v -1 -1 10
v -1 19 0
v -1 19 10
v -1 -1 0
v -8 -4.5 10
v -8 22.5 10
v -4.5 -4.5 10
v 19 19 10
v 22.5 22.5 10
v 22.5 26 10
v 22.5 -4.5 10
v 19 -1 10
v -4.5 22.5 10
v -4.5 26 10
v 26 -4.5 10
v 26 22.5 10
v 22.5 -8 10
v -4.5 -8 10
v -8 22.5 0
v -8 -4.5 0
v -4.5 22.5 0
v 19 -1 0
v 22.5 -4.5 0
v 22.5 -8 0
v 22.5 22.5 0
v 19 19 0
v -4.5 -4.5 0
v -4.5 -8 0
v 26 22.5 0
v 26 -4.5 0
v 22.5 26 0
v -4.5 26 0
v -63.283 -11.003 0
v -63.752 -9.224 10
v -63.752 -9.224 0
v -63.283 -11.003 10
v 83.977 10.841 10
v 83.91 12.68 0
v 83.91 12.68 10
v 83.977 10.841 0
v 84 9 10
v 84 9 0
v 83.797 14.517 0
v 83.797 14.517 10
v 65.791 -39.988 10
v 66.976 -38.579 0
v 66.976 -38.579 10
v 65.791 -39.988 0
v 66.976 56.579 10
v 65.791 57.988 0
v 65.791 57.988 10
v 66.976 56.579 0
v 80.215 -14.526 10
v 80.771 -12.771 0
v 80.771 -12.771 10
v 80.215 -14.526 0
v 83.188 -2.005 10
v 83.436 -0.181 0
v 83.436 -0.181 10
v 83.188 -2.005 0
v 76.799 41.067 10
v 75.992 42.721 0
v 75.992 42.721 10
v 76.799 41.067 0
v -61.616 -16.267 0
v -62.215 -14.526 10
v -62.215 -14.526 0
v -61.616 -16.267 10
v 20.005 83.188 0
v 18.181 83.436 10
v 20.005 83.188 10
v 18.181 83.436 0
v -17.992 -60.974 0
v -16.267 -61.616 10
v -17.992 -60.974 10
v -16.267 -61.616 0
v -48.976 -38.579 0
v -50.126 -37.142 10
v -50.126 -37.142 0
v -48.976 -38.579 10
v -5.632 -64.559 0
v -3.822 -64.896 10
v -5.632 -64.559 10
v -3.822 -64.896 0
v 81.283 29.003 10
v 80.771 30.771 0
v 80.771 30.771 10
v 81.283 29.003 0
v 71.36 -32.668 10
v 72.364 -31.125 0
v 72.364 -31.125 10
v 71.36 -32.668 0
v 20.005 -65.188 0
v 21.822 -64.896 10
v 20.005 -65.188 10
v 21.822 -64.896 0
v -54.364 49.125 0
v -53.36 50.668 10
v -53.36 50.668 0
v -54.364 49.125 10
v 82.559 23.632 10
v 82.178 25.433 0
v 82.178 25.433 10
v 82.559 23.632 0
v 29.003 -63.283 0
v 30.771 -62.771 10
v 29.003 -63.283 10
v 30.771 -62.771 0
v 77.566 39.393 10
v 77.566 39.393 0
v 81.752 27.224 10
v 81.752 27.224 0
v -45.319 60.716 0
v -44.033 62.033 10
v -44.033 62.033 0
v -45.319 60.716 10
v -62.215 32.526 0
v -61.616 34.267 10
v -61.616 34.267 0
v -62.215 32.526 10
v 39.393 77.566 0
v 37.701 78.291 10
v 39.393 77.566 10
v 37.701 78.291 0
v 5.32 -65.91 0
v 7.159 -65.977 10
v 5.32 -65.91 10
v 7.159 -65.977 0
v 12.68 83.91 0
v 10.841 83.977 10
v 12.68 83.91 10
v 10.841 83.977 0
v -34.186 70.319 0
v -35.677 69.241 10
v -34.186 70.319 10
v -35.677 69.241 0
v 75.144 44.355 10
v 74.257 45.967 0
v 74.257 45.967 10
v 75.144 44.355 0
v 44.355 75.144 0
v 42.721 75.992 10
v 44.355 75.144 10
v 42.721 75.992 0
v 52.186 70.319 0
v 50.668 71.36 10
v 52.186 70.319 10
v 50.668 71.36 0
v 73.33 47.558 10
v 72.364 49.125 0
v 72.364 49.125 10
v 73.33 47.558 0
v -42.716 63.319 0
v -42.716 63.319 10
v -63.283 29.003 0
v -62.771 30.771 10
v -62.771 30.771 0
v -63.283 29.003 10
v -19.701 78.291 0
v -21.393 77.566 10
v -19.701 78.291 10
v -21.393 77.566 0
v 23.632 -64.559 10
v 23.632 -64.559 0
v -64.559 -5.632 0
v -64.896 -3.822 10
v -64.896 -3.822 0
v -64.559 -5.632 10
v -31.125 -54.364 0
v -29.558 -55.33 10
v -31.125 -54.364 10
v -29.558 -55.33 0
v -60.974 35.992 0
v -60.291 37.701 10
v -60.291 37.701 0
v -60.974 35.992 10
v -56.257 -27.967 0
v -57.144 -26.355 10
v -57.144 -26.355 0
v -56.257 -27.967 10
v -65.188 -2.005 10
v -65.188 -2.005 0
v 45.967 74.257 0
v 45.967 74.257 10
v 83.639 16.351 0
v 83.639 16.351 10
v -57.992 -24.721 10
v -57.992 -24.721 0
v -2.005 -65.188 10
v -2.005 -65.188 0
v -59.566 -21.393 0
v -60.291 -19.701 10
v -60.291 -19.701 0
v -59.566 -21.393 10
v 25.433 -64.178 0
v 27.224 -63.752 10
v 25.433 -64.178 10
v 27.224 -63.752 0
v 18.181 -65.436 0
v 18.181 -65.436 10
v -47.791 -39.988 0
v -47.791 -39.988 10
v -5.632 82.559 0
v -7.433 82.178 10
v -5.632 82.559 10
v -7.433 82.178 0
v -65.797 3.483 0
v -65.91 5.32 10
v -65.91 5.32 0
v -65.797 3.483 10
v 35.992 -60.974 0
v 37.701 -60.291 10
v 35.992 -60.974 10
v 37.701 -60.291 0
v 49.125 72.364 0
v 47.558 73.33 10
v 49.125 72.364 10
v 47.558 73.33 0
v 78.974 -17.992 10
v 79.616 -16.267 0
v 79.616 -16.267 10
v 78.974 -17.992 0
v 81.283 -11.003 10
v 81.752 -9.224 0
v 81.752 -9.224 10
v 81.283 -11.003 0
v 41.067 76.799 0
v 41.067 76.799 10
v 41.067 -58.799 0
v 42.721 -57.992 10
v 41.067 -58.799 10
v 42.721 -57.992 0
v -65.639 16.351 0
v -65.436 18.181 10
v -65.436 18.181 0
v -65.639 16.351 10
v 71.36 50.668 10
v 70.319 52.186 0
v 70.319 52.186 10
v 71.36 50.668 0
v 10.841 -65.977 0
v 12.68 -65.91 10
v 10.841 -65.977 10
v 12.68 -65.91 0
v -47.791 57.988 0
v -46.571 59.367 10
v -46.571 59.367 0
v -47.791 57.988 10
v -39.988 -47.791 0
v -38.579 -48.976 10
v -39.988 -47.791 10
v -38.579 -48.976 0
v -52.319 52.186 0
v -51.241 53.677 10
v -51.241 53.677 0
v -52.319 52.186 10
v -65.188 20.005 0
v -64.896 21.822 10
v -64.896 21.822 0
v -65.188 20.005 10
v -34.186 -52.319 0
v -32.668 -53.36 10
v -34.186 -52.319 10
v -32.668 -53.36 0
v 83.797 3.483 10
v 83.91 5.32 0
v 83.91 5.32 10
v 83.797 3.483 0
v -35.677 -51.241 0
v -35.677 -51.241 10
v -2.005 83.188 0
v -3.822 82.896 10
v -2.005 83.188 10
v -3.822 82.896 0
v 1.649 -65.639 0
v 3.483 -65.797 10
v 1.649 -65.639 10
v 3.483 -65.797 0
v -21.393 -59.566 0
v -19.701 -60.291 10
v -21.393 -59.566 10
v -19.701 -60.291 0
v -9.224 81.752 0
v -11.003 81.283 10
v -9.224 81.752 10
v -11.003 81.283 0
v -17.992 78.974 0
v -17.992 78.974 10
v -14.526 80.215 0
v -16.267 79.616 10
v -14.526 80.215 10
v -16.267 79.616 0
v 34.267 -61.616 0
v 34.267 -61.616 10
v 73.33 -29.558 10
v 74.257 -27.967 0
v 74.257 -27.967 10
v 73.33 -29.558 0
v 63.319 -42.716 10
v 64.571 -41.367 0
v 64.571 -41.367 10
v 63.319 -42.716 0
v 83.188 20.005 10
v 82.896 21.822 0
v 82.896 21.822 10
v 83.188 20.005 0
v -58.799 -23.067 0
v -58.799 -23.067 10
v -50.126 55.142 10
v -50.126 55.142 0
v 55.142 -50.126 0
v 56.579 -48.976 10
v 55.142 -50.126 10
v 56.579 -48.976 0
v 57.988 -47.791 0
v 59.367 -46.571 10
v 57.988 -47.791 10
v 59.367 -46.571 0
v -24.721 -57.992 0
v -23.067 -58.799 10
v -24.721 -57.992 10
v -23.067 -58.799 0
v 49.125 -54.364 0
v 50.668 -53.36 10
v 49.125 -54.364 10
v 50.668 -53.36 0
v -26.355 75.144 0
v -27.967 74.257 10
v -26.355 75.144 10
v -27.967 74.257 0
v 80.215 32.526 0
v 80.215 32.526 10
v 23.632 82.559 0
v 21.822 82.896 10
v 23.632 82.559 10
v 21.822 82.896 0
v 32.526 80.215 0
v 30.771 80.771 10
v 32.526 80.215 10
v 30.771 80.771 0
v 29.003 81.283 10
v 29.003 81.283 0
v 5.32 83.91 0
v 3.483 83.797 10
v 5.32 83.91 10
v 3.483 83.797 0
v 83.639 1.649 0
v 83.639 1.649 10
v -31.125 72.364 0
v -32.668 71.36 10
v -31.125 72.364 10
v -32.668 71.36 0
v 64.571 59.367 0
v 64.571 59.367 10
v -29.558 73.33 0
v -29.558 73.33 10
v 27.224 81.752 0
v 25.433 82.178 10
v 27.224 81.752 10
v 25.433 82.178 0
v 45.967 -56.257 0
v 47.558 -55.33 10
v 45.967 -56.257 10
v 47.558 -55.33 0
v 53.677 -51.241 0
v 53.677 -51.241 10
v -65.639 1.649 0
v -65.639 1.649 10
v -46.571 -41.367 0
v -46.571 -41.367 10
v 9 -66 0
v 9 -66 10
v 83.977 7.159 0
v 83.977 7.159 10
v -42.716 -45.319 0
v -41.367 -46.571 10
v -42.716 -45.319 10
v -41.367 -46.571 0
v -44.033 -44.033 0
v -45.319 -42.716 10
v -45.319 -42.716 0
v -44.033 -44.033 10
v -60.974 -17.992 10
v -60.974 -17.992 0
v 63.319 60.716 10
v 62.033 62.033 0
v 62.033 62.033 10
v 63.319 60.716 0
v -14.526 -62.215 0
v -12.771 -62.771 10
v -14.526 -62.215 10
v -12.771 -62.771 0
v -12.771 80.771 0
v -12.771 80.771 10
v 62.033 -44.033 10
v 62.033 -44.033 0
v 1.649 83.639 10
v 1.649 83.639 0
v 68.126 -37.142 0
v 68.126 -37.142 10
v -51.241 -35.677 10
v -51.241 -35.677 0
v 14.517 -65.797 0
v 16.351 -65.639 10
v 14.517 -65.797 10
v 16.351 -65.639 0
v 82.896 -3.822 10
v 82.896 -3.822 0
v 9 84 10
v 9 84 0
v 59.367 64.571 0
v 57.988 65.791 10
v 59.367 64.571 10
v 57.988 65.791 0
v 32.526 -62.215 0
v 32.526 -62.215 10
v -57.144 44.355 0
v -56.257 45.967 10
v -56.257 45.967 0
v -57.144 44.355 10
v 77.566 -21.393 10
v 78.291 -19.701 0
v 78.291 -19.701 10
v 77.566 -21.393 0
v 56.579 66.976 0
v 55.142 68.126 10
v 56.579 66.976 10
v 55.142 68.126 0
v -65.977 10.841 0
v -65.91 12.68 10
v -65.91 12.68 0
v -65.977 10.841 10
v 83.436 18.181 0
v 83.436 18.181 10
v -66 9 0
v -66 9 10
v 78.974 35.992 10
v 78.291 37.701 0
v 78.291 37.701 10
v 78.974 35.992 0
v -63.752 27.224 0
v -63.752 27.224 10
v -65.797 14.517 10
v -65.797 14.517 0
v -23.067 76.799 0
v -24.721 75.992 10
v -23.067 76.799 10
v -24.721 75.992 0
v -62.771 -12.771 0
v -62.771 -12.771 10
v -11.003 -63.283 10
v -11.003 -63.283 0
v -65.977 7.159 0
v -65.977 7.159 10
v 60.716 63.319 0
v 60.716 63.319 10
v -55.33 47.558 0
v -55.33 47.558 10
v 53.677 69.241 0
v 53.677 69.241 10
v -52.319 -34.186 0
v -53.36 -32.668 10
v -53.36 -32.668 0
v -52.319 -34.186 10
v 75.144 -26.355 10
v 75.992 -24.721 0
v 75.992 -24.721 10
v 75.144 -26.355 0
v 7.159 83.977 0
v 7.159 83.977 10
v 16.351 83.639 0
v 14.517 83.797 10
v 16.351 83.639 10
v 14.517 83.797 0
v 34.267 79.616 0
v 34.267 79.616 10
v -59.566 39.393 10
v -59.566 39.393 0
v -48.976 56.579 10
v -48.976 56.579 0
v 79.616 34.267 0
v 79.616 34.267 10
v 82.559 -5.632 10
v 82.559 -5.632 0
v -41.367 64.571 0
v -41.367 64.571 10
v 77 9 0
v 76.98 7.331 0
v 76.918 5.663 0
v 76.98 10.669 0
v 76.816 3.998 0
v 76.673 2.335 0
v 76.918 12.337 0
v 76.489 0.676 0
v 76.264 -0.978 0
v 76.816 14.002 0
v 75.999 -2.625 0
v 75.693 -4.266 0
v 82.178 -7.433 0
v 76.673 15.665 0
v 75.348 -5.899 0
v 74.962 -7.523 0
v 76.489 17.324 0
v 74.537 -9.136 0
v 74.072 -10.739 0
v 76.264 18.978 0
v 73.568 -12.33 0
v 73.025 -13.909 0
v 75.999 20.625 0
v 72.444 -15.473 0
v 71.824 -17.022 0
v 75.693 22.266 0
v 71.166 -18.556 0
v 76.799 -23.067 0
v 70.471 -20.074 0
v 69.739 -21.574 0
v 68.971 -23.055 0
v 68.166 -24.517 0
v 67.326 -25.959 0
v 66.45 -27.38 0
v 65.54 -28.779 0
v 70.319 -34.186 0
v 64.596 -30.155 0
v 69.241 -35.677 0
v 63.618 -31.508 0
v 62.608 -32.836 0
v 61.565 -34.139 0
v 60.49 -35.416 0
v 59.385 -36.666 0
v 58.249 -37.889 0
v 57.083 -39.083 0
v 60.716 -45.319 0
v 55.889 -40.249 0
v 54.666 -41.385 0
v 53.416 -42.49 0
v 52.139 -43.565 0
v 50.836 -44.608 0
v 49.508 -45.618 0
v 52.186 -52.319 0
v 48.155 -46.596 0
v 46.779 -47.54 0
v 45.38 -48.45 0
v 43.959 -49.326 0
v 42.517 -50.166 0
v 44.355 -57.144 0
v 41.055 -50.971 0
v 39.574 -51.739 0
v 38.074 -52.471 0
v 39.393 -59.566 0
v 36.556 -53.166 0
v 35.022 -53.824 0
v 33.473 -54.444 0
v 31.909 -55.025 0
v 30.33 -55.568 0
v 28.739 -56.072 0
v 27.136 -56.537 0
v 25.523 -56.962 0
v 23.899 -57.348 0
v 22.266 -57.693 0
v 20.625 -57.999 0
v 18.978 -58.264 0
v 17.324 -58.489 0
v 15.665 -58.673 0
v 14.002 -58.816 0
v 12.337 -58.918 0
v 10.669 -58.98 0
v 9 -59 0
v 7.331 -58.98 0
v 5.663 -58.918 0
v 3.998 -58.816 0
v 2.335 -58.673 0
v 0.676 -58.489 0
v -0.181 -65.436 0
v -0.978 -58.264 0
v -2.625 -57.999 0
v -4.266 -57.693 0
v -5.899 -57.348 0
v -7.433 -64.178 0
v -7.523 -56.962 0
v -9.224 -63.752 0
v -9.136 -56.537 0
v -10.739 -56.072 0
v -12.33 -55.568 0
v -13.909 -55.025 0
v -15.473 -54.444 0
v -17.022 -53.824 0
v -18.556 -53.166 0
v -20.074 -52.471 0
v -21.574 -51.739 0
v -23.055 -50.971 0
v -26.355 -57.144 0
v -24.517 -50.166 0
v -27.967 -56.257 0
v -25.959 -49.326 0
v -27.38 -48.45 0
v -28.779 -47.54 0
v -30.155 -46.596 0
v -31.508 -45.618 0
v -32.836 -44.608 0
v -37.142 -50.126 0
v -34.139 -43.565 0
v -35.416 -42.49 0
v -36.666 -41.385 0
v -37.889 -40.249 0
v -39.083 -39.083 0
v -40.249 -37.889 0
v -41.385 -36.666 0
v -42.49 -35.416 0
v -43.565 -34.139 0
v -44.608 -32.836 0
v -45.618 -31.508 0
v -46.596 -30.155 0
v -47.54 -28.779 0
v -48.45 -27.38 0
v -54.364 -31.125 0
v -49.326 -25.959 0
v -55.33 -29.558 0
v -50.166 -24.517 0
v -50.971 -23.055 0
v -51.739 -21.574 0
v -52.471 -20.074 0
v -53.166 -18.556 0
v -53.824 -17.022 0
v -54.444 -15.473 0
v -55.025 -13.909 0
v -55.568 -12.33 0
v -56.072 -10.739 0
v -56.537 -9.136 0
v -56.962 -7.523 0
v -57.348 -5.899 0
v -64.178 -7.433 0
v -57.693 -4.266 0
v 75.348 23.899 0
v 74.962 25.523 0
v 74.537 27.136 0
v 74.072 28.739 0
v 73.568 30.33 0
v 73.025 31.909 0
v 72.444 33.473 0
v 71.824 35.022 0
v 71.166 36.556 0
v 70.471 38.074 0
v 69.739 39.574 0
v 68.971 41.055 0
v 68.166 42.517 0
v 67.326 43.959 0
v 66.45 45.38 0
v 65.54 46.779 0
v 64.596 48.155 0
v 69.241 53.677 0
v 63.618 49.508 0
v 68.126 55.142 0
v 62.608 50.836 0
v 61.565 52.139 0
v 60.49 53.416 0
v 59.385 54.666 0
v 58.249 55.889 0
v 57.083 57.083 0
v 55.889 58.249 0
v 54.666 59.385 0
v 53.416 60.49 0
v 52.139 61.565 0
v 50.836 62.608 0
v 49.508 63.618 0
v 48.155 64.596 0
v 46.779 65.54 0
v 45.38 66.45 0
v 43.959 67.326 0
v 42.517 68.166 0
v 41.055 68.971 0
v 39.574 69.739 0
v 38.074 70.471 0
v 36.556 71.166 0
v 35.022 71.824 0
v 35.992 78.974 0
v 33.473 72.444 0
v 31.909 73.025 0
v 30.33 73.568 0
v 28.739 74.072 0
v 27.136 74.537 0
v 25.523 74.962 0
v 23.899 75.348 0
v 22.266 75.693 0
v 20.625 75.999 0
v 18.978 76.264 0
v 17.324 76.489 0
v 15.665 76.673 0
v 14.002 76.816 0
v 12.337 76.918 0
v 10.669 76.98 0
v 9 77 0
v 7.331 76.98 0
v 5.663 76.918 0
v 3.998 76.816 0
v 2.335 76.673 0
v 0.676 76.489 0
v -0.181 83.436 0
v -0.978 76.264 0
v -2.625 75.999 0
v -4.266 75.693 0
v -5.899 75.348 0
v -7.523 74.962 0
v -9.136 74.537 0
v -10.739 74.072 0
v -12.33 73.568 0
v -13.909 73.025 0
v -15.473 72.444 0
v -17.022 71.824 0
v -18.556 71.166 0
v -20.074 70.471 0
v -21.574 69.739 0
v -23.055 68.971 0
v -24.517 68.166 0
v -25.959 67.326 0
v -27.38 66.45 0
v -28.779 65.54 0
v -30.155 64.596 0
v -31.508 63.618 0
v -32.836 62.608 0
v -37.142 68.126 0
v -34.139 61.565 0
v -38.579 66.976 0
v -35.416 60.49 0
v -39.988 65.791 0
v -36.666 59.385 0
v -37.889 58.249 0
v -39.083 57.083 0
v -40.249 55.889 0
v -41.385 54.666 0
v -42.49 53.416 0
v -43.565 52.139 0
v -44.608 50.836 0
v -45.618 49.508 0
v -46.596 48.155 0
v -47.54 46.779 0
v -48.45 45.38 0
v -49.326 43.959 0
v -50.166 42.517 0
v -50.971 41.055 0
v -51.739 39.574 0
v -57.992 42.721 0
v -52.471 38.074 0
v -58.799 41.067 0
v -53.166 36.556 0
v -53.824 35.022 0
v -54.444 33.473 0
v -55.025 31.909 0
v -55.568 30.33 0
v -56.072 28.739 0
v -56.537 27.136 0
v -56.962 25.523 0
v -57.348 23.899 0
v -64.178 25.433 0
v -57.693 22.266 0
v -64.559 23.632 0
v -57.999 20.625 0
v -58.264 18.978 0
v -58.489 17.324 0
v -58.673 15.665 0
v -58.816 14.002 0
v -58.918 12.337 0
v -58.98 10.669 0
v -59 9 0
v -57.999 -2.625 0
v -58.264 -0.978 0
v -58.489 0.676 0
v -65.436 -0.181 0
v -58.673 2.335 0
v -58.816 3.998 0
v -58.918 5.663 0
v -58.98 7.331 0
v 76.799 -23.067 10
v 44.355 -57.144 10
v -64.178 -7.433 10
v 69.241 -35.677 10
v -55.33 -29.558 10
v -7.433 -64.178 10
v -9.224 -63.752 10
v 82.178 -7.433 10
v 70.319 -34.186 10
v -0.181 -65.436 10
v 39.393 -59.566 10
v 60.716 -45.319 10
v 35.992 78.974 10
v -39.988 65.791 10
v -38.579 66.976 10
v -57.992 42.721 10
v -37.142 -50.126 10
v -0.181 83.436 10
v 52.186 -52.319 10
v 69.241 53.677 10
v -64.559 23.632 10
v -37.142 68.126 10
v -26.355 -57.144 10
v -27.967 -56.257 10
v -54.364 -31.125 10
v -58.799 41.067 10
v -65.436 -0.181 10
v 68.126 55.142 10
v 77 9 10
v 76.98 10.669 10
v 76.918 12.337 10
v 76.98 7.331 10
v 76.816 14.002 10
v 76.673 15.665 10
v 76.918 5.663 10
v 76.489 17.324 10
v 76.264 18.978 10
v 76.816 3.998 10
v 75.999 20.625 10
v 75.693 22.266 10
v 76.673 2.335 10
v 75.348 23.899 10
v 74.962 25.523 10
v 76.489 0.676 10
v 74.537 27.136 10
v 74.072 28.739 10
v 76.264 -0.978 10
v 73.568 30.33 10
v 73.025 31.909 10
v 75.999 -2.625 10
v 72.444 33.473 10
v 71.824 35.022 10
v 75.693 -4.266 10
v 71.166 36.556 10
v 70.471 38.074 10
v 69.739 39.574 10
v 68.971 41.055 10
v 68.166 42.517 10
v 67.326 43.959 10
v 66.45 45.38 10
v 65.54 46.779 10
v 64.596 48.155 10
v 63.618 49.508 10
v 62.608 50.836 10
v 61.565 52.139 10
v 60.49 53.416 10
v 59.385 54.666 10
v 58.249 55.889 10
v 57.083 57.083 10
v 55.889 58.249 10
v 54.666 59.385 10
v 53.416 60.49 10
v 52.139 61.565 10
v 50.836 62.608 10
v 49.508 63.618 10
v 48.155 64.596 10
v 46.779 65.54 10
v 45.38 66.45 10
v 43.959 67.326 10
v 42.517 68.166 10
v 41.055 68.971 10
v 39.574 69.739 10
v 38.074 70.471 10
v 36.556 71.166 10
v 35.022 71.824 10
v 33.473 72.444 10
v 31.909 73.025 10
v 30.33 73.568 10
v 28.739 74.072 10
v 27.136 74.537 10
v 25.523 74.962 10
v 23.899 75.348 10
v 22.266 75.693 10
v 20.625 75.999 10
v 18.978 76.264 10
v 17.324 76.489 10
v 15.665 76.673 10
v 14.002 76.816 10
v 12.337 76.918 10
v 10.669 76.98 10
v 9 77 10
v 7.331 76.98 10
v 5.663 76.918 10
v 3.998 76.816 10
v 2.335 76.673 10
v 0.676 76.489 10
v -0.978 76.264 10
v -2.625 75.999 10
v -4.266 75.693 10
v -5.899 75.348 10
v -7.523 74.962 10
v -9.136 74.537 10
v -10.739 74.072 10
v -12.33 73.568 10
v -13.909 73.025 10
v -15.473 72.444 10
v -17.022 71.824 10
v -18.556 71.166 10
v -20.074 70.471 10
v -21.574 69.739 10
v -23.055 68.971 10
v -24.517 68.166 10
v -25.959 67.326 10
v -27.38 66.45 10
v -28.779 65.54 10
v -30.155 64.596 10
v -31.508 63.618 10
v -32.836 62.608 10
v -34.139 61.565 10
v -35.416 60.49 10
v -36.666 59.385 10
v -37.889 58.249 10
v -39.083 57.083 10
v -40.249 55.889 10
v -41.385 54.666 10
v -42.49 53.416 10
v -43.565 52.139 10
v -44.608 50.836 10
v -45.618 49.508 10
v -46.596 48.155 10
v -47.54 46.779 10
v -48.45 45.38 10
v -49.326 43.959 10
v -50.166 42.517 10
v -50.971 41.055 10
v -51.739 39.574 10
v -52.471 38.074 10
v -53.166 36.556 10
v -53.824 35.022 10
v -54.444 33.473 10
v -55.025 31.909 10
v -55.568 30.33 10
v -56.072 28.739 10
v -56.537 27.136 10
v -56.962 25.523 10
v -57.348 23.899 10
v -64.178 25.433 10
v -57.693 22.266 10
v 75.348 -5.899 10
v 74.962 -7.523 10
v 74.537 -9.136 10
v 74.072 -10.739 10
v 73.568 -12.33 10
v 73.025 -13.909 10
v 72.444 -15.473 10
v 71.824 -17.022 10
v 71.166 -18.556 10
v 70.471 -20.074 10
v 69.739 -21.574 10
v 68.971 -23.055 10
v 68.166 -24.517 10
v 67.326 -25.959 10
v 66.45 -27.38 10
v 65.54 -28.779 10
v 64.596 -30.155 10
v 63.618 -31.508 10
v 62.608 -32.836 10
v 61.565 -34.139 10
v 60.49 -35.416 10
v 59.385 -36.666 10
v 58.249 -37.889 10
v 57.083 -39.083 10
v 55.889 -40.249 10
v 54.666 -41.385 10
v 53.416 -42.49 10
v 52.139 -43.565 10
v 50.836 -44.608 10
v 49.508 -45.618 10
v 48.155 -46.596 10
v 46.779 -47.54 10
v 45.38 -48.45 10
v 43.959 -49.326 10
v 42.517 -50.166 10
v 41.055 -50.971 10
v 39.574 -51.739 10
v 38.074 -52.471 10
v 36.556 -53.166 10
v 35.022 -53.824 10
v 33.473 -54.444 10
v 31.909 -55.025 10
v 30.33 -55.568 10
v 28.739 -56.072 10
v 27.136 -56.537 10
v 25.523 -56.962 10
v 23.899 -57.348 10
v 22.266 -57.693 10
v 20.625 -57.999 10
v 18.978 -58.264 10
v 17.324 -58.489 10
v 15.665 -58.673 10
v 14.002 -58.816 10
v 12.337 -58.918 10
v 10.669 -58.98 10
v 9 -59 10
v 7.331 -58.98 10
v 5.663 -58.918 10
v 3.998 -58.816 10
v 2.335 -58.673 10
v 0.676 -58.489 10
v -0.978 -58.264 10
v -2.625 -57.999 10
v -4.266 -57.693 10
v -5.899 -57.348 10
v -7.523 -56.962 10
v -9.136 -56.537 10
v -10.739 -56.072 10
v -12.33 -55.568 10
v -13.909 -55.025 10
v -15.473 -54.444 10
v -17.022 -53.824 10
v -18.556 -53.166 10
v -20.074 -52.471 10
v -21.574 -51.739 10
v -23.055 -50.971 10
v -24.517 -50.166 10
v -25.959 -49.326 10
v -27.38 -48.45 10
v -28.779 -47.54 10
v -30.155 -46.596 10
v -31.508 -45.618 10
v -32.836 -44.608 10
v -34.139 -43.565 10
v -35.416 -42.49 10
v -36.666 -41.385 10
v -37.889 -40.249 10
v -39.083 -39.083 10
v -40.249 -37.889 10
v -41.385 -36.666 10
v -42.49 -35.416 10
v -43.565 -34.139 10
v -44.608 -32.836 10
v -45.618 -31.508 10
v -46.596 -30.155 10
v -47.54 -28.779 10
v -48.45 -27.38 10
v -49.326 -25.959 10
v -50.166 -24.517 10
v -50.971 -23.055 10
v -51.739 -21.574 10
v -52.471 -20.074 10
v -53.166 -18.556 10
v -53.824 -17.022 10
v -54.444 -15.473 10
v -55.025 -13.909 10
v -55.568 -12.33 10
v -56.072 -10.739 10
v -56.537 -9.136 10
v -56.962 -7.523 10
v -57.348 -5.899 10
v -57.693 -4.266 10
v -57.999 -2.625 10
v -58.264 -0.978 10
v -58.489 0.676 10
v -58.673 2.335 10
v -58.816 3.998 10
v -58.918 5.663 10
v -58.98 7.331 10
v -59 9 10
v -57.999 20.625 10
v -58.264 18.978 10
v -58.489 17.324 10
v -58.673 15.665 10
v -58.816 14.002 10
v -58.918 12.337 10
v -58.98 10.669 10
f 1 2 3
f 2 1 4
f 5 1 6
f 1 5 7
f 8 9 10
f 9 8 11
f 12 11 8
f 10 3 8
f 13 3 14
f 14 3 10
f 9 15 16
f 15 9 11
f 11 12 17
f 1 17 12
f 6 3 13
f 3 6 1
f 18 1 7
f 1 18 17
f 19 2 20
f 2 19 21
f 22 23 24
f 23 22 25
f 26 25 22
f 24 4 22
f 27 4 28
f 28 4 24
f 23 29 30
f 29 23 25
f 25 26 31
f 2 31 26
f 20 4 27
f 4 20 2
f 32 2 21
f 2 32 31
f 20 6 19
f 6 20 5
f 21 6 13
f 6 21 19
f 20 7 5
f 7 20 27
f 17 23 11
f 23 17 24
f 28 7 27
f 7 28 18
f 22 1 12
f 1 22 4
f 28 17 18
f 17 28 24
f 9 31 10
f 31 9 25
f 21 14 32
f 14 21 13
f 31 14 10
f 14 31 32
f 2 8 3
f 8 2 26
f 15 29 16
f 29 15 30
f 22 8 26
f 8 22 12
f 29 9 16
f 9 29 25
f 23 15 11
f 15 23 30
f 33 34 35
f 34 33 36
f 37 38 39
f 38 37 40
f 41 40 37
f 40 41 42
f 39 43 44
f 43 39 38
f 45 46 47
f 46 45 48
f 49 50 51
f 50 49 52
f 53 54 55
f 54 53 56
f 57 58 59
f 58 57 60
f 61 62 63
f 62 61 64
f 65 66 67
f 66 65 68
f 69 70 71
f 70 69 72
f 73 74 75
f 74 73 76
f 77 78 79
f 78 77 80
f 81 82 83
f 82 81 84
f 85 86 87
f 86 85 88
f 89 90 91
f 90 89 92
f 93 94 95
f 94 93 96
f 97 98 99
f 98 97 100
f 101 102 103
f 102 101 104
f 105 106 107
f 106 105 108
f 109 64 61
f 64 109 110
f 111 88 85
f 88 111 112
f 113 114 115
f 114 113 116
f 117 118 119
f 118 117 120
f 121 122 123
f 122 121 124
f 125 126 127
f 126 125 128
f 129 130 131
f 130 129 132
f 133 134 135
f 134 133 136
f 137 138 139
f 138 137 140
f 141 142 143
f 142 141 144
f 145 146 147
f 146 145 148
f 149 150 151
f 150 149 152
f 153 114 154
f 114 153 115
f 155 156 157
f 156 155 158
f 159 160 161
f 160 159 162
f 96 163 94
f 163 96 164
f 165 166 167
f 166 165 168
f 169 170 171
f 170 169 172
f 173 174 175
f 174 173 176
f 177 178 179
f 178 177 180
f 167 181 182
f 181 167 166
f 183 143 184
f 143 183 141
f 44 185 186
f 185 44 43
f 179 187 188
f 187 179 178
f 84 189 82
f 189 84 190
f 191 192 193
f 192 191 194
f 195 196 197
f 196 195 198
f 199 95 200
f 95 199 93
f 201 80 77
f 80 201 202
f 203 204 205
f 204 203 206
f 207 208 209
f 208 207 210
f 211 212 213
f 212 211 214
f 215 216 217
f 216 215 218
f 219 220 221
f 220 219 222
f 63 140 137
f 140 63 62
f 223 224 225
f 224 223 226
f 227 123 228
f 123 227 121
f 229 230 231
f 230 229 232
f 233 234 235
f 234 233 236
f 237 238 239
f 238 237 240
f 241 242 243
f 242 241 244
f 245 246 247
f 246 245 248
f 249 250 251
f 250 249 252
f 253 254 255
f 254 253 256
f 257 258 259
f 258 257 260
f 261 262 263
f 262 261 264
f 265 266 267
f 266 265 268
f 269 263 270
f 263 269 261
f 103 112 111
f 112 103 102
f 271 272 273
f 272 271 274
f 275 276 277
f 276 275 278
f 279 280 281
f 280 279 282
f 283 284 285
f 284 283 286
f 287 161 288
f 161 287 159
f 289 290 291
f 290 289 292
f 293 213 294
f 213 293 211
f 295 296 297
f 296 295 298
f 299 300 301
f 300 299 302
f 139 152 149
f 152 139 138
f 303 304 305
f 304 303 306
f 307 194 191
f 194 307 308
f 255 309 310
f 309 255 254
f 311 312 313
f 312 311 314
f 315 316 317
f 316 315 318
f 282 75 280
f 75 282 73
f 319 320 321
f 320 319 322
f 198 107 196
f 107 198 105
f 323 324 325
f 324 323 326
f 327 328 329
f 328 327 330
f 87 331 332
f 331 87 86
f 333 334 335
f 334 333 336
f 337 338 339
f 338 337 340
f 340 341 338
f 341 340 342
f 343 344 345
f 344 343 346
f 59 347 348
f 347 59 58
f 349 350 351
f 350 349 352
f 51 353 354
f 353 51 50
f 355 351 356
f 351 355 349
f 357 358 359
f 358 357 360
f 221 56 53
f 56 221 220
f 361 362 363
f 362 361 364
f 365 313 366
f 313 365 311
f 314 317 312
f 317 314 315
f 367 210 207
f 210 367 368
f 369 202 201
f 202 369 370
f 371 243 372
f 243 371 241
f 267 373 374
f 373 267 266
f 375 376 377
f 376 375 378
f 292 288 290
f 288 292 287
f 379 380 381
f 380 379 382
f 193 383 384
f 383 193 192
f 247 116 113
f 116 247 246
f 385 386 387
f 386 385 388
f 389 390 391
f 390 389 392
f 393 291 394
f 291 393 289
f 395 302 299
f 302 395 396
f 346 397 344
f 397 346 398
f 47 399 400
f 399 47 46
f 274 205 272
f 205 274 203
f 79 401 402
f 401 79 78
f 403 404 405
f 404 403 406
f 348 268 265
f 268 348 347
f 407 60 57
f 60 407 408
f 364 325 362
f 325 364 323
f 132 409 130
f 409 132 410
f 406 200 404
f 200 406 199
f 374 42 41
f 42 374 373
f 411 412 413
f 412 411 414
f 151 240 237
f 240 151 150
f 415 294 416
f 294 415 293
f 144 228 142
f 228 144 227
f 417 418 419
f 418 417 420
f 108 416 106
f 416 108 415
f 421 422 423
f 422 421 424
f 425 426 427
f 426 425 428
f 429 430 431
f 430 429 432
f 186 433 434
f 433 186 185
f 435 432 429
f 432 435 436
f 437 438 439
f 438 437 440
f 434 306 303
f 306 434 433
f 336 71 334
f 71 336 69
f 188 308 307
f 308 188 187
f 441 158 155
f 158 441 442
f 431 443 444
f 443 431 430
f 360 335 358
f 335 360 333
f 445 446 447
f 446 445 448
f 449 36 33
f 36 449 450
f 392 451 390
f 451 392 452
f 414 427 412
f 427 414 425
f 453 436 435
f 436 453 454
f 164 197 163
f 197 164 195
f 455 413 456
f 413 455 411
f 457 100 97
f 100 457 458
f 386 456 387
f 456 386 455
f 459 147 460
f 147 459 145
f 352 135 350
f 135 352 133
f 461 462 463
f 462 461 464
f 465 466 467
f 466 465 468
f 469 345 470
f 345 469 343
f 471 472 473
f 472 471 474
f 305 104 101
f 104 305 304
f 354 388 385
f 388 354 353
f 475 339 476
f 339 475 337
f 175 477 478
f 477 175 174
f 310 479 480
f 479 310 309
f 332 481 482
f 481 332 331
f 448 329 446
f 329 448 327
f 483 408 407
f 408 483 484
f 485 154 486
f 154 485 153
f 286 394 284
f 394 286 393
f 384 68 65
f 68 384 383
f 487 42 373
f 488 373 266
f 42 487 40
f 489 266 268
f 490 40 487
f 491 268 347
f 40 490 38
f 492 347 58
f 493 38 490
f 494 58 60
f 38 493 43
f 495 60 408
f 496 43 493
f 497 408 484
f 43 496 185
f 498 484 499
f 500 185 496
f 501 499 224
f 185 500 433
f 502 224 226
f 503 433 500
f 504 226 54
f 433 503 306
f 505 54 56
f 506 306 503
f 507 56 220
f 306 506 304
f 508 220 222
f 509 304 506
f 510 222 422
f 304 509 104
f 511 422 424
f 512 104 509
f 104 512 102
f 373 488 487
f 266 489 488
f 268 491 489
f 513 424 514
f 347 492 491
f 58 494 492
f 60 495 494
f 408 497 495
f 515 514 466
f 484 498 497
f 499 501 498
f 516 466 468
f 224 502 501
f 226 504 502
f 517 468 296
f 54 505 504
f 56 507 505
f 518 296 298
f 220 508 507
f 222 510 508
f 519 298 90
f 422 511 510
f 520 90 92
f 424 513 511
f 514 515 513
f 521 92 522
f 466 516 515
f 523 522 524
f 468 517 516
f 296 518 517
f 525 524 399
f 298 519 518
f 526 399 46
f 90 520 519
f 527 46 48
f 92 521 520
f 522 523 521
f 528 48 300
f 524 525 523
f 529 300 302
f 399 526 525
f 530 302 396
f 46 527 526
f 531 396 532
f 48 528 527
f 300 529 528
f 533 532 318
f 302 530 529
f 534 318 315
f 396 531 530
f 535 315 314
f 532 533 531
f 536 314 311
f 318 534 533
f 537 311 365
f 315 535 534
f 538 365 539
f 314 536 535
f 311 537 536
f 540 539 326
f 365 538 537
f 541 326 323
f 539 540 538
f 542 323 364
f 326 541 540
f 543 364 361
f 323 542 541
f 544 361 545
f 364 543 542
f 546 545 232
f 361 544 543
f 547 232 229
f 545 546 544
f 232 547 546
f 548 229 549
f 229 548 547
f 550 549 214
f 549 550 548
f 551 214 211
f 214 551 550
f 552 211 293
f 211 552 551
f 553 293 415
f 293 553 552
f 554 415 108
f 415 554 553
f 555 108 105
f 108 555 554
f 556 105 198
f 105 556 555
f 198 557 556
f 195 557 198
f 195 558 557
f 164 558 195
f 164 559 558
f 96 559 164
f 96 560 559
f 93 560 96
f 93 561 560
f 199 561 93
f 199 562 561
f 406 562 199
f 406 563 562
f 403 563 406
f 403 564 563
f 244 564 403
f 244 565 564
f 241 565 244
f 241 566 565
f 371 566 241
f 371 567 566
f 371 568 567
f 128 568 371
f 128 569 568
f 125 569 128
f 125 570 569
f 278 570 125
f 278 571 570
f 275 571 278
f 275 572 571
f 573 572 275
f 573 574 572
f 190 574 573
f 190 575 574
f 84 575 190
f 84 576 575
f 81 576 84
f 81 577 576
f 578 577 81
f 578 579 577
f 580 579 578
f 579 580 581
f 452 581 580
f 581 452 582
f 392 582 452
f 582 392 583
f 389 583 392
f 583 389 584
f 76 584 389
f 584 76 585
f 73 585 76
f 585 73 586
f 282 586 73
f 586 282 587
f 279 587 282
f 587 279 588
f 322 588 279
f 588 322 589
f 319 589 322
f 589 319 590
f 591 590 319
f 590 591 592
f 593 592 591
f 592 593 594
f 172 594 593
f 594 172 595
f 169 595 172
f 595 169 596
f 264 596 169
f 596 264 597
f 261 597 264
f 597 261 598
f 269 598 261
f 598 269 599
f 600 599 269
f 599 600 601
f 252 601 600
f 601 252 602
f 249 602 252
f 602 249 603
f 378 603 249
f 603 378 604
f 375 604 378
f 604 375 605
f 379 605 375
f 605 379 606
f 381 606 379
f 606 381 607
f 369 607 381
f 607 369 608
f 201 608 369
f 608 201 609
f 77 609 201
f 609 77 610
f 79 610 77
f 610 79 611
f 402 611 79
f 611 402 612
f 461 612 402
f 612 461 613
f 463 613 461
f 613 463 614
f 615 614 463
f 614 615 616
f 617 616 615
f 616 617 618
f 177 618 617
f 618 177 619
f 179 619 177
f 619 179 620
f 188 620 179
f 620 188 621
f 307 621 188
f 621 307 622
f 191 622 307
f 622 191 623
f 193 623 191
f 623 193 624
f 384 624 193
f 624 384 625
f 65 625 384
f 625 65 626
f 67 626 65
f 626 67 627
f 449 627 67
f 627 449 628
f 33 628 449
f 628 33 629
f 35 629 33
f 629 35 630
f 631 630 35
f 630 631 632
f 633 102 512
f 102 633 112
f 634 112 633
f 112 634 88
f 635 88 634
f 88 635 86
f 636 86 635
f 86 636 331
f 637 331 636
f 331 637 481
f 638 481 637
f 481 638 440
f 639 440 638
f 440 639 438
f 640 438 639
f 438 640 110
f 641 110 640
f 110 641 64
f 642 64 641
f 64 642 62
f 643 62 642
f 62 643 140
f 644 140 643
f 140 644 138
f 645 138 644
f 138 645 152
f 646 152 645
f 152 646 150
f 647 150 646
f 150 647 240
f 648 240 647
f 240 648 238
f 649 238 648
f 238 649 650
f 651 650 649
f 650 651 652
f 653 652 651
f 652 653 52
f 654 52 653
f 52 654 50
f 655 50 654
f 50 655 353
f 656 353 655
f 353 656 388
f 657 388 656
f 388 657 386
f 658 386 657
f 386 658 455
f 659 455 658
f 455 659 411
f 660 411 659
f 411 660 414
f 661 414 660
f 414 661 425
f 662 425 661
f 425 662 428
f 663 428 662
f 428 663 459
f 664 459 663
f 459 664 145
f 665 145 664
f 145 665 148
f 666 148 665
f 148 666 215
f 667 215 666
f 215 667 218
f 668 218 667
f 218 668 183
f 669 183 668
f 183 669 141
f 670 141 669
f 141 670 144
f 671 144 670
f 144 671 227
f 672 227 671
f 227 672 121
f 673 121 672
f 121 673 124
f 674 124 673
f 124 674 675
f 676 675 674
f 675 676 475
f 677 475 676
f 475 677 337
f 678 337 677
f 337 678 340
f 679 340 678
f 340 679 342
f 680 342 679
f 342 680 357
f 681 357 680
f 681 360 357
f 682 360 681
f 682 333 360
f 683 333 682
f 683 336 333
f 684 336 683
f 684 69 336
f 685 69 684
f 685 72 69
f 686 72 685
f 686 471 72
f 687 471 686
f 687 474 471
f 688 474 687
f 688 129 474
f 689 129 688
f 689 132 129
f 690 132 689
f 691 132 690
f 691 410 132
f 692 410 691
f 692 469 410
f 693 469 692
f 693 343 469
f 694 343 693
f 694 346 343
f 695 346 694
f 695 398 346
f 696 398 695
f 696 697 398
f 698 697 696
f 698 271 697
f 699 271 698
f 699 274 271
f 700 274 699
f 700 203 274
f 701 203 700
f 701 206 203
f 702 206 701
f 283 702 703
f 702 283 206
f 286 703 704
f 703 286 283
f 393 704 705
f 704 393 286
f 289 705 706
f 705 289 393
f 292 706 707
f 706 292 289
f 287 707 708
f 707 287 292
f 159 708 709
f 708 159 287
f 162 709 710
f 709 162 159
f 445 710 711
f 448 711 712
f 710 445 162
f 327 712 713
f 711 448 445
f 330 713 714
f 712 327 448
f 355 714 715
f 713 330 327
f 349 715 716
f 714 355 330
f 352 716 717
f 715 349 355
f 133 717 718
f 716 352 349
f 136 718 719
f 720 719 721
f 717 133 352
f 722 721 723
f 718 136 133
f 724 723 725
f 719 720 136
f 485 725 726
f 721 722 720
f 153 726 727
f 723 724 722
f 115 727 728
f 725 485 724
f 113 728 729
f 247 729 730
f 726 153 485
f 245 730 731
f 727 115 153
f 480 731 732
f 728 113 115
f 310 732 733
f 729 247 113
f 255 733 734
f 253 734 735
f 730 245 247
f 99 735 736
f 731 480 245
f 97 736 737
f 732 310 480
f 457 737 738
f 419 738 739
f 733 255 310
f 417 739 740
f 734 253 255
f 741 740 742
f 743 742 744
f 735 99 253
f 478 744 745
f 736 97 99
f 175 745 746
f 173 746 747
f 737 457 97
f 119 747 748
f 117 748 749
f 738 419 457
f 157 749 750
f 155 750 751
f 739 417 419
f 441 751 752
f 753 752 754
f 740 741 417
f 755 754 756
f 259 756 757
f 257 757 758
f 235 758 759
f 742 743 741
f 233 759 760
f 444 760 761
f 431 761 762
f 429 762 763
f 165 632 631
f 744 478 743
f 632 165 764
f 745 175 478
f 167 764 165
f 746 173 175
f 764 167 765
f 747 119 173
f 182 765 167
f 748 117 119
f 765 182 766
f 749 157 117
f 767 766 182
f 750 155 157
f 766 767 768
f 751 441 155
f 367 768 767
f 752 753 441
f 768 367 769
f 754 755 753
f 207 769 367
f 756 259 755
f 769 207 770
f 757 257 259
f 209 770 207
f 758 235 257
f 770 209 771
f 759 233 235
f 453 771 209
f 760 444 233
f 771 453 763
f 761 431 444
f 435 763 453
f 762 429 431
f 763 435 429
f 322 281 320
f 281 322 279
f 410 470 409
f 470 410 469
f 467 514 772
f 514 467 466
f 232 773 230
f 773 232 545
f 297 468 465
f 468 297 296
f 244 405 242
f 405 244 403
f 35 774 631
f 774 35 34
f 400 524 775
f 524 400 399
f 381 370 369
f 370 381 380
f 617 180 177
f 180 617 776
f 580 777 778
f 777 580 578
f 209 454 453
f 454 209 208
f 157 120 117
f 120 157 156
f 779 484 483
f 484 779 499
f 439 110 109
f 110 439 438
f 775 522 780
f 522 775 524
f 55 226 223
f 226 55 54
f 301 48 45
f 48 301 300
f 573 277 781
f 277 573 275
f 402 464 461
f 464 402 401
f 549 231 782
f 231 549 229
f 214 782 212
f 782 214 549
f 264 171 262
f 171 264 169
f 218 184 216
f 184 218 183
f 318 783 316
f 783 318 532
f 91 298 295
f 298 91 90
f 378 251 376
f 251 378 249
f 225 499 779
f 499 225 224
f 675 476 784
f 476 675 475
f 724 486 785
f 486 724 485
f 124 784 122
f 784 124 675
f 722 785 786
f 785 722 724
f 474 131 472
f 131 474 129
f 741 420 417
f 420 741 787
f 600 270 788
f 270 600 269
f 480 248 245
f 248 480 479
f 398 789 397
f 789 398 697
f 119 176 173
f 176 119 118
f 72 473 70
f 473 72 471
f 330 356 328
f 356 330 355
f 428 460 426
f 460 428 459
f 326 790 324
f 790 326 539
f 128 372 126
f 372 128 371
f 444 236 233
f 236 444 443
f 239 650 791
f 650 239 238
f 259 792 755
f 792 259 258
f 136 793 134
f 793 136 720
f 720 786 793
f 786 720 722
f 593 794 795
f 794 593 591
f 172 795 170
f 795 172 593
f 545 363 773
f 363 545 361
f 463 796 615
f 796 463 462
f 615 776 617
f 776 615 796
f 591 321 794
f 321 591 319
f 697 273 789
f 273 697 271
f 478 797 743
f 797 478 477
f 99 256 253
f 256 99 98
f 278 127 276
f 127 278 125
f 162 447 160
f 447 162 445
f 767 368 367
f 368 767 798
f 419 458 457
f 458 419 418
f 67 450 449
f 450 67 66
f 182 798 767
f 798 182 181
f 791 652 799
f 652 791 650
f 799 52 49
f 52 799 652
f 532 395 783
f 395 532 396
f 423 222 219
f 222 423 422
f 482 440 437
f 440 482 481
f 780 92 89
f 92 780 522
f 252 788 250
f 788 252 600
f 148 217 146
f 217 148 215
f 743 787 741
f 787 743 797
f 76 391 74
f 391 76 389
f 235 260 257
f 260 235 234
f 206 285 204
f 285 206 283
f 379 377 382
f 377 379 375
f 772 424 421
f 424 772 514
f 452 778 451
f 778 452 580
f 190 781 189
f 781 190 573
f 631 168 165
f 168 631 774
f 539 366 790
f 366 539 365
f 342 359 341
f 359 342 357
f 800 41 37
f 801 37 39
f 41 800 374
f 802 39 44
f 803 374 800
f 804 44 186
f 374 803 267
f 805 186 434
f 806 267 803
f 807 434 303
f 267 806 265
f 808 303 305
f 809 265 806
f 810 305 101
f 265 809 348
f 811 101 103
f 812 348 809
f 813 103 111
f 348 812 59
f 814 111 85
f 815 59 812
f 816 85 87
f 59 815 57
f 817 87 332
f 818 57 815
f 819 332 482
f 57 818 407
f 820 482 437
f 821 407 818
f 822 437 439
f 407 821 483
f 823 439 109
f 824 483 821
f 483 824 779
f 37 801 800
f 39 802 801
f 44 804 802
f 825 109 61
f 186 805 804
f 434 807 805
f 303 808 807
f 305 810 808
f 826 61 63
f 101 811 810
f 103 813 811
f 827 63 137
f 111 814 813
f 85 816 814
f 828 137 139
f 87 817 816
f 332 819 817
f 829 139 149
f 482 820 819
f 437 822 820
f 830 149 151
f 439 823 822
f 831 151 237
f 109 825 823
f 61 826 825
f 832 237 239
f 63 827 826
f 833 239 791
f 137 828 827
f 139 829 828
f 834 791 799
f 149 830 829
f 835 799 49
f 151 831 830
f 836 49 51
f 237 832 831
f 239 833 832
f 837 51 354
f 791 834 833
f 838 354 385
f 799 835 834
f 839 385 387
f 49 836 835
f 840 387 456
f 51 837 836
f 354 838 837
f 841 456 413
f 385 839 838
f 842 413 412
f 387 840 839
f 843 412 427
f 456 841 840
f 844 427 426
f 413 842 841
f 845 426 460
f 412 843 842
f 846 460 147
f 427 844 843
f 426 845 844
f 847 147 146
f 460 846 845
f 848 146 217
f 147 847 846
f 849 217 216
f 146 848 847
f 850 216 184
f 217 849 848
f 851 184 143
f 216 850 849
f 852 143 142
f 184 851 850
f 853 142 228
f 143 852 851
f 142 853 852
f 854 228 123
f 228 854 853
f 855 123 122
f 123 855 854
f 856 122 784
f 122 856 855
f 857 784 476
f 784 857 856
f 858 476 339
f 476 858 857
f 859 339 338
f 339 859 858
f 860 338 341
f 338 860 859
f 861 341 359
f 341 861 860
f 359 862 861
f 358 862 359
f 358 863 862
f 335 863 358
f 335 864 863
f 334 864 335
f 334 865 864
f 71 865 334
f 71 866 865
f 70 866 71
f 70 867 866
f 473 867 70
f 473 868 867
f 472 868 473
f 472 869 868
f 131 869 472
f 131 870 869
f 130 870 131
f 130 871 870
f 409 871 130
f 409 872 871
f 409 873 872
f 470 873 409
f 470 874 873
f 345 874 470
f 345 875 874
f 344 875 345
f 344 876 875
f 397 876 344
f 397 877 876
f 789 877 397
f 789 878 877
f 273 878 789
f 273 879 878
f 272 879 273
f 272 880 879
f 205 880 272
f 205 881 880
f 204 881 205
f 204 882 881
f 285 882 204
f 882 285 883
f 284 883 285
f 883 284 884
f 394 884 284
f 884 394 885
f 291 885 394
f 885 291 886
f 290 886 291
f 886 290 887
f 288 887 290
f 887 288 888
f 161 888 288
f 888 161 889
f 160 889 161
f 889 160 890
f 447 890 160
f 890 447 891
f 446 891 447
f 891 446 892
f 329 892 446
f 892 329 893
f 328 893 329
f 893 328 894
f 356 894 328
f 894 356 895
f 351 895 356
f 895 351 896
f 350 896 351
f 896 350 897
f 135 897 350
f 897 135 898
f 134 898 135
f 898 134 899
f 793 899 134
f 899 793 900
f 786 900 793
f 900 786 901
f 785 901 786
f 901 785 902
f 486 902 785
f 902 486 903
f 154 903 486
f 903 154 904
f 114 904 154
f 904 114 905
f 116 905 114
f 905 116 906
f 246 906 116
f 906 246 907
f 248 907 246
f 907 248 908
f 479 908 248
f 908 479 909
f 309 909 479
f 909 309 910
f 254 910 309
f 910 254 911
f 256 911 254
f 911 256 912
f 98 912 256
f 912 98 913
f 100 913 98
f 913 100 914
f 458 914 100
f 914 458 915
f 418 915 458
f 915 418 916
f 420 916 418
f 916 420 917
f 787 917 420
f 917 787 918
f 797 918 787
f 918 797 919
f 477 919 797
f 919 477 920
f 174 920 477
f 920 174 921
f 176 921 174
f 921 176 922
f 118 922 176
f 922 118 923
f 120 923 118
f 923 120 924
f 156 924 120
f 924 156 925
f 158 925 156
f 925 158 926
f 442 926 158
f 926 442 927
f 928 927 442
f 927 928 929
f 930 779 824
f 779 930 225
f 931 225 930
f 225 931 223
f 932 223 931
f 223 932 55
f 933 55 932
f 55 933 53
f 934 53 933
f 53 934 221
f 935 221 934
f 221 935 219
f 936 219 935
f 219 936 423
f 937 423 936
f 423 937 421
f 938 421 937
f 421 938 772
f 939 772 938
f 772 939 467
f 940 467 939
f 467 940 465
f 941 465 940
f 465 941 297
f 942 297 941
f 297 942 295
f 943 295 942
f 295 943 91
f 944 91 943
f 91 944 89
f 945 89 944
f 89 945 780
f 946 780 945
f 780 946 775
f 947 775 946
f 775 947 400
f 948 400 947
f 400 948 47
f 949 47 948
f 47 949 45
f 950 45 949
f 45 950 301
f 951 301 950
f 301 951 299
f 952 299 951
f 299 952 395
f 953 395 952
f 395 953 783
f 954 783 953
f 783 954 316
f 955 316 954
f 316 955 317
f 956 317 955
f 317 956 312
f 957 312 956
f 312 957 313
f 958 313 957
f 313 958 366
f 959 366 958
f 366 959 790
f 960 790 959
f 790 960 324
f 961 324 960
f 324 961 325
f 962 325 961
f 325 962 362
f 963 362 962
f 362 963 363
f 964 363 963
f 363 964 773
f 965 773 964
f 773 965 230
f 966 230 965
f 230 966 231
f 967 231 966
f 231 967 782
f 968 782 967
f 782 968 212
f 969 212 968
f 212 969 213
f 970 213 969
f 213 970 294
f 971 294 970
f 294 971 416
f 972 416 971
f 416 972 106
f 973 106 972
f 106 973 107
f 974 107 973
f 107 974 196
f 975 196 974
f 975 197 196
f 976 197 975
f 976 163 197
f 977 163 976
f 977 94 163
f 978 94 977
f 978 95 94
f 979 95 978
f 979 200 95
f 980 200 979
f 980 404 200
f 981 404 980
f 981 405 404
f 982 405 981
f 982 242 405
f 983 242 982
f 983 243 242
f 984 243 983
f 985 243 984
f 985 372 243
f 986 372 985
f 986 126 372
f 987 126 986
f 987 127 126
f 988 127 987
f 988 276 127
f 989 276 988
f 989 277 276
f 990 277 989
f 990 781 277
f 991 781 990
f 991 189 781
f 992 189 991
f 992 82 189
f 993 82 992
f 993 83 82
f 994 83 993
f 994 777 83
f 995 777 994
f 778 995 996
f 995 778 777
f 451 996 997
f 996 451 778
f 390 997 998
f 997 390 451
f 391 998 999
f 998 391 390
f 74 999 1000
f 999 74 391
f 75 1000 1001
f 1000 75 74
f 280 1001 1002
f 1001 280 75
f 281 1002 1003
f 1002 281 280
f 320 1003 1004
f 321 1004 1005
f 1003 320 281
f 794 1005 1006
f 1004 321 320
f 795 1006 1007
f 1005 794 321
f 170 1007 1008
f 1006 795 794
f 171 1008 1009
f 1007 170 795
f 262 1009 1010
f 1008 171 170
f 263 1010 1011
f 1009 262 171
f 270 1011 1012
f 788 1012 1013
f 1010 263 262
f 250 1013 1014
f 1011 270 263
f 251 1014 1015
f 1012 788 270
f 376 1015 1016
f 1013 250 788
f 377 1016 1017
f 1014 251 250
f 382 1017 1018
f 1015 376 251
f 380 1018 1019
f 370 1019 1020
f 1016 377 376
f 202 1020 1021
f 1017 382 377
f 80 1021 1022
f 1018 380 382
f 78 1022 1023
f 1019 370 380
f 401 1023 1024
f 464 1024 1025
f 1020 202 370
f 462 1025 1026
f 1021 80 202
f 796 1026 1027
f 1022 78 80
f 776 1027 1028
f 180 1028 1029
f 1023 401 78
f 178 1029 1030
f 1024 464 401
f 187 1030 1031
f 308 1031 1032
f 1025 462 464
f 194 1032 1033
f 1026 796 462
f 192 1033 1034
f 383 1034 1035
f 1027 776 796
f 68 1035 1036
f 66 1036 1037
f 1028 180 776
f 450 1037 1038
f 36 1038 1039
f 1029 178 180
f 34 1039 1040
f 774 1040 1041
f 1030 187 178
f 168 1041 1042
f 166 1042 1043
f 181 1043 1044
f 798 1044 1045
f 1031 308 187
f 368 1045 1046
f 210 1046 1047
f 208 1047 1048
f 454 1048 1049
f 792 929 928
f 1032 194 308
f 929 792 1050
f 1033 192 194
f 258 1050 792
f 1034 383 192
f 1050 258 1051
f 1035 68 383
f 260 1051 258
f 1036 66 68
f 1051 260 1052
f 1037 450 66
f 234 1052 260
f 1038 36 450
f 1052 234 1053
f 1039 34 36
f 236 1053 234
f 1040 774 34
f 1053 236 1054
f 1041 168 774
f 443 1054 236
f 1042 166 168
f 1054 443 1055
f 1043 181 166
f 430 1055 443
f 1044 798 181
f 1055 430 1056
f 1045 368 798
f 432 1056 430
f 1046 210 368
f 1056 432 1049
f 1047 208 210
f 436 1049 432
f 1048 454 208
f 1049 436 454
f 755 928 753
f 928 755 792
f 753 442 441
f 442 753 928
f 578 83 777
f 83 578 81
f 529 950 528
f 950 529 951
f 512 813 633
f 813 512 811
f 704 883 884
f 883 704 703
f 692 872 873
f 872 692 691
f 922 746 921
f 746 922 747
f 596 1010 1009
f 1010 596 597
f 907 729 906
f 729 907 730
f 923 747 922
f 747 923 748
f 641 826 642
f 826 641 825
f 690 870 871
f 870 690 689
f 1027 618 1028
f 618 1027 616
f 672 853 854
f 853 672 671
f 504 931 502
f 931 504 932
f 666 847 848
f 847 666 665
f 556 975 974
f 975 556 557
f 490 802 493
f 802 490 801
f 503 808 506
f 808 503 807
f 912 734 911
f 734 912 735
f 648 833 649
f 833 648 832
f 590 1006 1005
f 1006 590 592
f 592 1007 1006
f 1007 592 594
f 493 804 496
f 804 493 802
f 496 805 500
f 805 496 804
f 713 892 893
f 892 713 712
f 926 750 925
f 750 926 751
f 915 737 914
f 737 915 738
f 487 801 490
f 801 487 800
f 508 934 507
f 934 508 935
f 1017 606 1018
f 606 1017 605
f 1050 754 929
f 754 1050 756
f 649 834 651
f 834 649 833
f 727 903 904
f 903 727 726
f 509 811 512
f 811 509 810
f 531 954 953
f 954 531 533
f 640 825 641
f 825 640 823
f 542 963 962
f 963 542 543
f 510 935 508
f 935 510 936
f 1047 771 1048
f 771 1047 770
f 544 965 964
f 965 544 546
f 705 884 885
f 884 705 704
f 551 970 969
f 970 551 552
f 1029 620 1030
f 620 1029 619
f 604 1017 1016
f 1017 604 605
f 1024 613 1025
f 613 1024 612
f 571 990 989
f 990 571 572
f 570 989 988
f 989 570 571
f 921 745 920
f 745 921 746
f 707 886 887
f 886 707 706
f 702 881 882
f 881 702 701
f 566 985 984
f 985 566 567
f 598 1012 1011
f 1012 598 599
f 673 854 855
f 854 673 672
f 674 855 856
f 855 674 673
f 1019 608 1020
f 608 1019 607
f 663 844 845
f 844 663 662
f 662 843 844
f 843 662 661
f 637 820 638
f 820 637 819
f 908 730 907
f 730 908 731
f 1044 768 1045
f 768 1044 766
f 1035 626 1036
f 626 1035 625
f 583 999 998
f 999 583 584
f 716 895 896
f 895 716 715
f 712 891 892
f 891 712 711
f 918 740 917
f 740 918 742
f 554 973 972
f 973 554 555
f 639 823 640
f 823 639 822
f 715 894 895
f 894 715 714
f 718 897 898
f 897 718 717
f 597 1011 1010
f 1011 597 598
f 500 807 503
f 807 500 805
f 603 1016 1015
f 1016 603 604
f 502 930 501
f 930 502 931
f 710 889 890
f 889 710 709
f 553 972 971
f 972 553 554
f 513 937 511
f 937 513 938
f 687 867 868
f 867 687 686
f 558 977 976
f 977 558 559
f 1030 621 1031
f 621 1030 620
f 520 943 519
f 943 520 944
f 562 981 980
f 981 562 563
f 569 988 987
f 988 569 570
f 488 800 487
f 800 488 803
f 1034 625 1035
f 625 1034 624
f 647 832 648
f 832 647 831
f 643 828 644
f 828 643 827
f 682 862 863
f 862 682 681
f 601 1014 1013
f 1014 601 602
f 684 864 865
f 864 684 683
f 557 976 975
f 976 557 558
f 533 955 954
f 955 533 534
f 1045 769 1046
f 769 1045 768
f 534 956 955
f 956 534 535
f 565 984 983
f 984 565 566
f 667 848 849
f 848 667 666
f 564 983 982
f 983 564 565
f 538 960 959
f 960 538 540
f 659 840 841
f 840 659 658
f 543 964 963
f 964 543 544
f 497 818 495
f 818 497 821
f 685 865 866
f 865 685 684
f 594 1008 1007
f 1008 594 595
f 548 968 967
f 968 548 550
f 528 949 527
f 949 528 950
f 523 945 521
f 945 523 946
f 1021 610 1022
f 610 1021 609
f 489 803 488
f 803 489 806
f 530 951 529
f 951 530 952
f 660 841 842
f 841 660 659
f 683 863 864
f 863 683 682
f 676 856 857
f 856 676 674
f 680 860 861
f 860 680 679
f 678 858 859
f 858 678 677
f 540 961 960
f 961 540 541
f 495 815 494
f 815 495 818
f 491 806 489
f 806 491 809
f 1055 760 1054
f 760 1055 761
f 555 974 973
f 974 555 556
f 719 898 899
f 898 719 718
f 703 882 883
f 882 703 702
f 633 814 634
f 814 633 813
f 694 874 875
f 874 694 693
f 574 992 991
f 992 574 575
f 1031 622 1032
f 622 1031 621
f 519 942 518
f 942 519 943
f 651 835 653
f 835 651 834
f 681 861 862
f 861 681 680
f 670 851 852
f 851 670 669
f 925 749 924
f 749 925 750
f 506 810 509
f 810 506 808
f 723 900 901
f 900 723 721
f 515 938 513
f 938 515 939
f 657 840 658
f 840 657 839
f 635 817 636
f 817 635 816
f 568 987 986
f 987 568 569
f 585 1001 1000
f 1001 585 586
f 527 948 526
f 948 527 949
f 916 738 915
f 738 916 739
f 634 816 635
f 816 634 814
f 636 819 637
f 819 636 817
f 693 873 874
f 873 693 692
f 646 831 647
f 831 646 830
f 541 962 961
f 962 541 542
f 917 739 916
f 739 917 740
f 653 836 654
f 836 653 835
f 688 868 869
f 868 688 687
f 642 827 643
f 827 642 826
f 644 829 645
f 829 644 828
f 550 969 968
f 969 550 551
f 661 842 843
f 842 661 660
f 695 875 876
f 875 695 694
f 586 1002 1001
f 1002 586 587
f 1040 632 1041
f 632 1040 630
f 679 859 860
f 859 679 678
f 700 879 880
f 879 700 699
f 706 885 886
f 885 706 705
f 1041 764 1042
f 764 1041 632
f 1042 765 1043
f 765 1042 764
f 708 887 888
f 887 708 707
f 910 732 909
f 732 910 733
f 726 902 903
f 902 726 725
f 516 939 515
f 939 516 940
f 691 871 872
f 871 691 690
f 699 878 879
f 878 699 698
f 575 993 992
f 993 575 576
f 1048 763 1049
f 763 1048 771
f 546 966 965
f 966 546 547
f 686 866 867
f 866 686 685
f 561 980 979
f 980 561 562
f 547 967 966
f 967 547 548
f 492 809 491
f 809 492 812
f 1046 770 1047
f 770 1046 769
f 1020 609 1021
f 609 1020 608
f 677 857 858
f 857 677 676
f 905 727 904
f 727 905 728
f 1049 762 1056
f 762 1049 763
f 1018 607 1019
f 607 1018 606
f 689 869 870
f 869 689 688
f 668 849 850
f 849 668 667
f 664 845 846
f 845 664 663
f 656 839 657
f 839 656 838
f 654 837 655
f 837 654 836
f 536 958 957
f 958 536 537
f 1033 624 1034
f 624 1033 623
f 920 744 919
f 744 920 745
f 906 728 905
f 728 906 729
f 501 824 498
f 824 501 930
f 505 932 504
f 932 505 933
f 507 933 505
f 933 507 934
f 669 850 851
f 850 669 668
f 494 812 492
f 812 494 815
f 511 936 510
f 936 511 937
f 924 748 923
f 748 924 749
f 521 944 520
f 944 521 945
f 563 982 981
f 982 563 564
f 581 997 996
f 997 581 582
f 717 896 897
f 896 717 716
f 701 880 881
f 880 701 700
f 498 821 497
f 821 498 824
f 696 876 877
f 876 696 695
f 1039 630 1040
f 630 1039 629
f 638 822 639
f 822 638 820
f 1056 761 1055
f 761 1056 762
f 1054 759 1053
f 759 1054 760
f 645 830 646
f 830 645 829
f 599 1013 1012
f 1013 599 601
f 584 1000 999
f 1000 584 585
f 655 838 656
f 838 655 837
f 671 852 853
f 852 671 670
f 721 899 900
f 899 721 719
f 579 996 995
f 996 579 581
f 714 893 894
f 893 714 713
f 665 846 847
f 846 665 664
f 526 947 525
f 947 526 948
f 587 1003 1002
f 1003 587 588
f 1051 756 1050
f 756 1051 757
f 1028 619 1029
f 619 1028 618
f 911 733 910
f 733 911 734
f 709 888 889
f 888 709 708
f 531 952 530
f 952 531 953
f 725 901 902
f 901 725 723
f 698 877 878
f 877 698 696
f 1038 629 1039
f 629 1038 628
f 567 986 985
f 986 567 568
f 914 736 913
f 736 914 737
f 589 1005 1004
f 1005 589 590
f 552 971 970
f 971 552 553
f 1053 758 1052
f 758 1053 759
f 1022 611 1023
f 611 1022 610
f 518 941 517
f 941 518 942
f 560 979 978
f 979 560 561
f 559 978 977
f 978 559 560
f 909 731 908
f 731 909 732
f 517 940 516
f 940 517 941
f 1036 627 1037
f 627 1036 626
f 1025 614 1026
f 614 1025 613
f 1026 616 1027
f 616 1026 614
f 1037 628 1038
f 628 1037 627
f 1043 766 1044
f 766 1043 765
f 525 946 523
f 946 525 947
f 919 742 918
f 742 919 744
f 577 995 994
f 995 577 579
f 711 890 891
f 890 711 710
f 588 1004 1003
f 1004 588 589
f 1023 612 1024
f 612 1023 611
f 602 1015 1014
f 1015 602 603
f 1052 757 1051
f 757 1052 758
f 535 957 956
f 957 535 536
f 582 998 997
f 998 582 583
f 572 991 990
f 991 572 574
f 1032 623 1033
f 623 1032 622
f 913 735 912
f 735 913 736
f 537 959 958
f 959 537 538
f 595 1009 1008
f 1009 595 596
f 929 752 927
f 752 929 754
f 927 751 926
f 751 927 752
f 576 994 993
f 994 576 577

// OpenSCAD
// Generated by SolidPython 1.1.3 on 2026-06-23 12:55:45


union() {
	union() {
		translate(v = [-4.5000000000, 9.0000000000, 5.0000000000]) {
			cube(center = true, size = [7, 27, 10]);
		}
		translate(v = [9.0000000000, -4.5000000000, 5.0000000000]) {
			cube(center = true, size = [27, 7, 10]);
		}
		translate(v = [0, 27]) {
			translate(v = [9.0000000000, -4.5000000000, 5.0000000000]) {
				cube(center = true, size = [27, 7, 10]);
			}
		}
		translate(v = [27, 0]) {
			translate(v = [-4.5000000000, 9.0000000000, 5.0000000000]) {
				cube(center = true, size = [7, 27, 10]);
			}
		}
	}
	translate(v = [9.0000000000, 9.0000000000]) {
		difference() {
			cylinder($fn = 256, h = 10, r = 75.0000000000);
			cylinder($fn = 256, h = 10, r = 68.0000000000);
		}
	}
}
/***********************************************
*********      SolidPython code:      **********
************************************************

"""SCAD file export functions.

This module provides functions for exporting OpenSCAD geometries to .scad files.
"""

from typing import Dict, Optional
from pathlib import Path
import solid

from .config import ExportConfiguration, FileNamingConfig


def export_scad(
    geometry: solid.OpenSCADObject, output_path: Path, header: Optional[str] = None
) -> Path:
    """Export geometry to SCAD file.

    Parameters
    ----------
    geometry : solid.OpenSCADObject
        Geometry to export.
    output_path : Path
        Output file path.
    header : str, optional
        Header comment to add to SCAD file.

    Returns
    -------
    Path
        Path to created SCAD file.

    Raises
    ------
    IOError
        If file cannot be written.

    Examples
    --------
    >>> from pathlib import Path
    >>> import solid
    >>>
    >>> geometry = solid.cube([10, 10, 10])
    >>> output_path = Path('output/device.scad')
    >>> export_scad(geometry, output_path)
    """
    # Ensure parent directory exists
    output_path.parent.mkdir(parents=True, exist_ok=True)

    # Render to file
    try:
        solid.scad_render_to_file(geometry, str(output_path))
    except Exception as e:
        raise IOError(f"Failed to write SCAD file to {output_path}: {e}")

    _normalize_scad_file(output_path)

    # Add header if provided
    if header:
        _add_header_to_scad(output_path, header)
        _normalize_scad_file(output_path)

    return output_path


def _normalize_scad_file(scad_path: Path) -> None:
    """Strip trailing whitespace from generated SCAD text."""
    content = scad_path.read_text()
    normalized = "\n".join(line.rstrip() for line in content.splitlines()) + "\n"
    if normalized != content:
        scad_path.write_text(normalized)


def export_multiple_scad(
    geometries: Dict[str, solid.OpenSCADObject],
    config: ExportConfiguration,
    naming_config: Optional[FileNamingConfig] = None,
) -> Dict[str, Path]:
    """Export multiple geometries to SCAD files.

    Parameters
    ----------
    geometries : dict
        Dictionary mapping prefixes to geometries.
        Keys are used as filename prefixes.
    config : ExportConfiguration
        Export configuration.
    naming_config : FileNamingConfig, optional
        File naming configuration.

    Returns
    -------
    dict
        Dictionary mapping prefixes to output paths.

    Examples
    --------
    >>> geometries = {
    ...     'wells': wells_geometry,
    ...     'channels': channels_geometry,
    ...     'device': device_geometry
    ... }
    >>> config = ExportConfiguration(output_directory=Path('output'))
    >>> paths = export_multiple_scad(geometries, config)
    """
    output_paths = {}

    for prefix, geometry in geometries.items():
        # Create naming config for this geometry
        if naming_config:
            file_config = FileNamingConfig(
                prefix=prefix,
                version=naming_config.version,
                grid_size=naming_config.grid_size,
                suffix=naming_config.suffix,
            )
        else:
            file_config = FileNamingConfig(prefix=prefix)

        # Generate filename
        filename = file_config.generate_filename("scad")
        output_path = config.get_output_path(filename)

        # Export
        export_scad(geometry, output_path)
        output_paths[prefix] = output_path

    return output_paths


def _add_header_to_scad(scad_path: Path, header: str):
    """Add header comment to existing SCAD file.

    Parameters
    ----------
    scad_path : Path
        Path to SCAD file.
    header : str
        Header text to add.
    """
    # Read existing content
    with open(scad_path, "r") as f:
        content = f.read()

    # Prepend header
    header_comment = f"// {header}\n\n"
    with open(scad_path, "w") as f:
        f.write(header_comment + content)


def generate_scad_header(
    device_name: str, version: Optional[str] = None, description: Optional[str] = None
) -> str:
    """Generate SCAD file header comment.

    Parameters
    ----------
    device_name : str
        Device name.
    version : str, optional
        Version string.
    description : str, optional
        Device description.

    Returns
    -------
    str
        Header comment text.

    Examples
    --------
    >>> header = generate_scad_header(
    ...     'Two Compartment Device',
    ...     version='v1',
    ...     description='96-well format with microchannels'
    ... )
    """
    lines = []
    lines.append("=" * 60)
    lines.append(f"Device: {device_name}")

    if version:
        lines.append(f"Version: {version}")

    if description:
        lines.append(f"Description: {description}")

    lines.append("Generated by OpenMFD")
    lines.append("=" * 60)

    return "\n".join(lines)


def validate_scad_file(scad_path: Path) -> bool:
    """Validate that SCAD file exists and is readable.

    Parameters
    ----------
    scad_path : Path
        Path to SCAD file.

    Returns
    -------
    bool
        True if file is valid, False otherwise.
    """
    if not scad_path.exists():
        return False

    if not scad_path.is_file():
        return False

    # Try to read file
    try:
        with open(scad_path, "r") as f:
            content = f.read()
        return len(content) > 0
    except Exception:
        return False


************************************************/
